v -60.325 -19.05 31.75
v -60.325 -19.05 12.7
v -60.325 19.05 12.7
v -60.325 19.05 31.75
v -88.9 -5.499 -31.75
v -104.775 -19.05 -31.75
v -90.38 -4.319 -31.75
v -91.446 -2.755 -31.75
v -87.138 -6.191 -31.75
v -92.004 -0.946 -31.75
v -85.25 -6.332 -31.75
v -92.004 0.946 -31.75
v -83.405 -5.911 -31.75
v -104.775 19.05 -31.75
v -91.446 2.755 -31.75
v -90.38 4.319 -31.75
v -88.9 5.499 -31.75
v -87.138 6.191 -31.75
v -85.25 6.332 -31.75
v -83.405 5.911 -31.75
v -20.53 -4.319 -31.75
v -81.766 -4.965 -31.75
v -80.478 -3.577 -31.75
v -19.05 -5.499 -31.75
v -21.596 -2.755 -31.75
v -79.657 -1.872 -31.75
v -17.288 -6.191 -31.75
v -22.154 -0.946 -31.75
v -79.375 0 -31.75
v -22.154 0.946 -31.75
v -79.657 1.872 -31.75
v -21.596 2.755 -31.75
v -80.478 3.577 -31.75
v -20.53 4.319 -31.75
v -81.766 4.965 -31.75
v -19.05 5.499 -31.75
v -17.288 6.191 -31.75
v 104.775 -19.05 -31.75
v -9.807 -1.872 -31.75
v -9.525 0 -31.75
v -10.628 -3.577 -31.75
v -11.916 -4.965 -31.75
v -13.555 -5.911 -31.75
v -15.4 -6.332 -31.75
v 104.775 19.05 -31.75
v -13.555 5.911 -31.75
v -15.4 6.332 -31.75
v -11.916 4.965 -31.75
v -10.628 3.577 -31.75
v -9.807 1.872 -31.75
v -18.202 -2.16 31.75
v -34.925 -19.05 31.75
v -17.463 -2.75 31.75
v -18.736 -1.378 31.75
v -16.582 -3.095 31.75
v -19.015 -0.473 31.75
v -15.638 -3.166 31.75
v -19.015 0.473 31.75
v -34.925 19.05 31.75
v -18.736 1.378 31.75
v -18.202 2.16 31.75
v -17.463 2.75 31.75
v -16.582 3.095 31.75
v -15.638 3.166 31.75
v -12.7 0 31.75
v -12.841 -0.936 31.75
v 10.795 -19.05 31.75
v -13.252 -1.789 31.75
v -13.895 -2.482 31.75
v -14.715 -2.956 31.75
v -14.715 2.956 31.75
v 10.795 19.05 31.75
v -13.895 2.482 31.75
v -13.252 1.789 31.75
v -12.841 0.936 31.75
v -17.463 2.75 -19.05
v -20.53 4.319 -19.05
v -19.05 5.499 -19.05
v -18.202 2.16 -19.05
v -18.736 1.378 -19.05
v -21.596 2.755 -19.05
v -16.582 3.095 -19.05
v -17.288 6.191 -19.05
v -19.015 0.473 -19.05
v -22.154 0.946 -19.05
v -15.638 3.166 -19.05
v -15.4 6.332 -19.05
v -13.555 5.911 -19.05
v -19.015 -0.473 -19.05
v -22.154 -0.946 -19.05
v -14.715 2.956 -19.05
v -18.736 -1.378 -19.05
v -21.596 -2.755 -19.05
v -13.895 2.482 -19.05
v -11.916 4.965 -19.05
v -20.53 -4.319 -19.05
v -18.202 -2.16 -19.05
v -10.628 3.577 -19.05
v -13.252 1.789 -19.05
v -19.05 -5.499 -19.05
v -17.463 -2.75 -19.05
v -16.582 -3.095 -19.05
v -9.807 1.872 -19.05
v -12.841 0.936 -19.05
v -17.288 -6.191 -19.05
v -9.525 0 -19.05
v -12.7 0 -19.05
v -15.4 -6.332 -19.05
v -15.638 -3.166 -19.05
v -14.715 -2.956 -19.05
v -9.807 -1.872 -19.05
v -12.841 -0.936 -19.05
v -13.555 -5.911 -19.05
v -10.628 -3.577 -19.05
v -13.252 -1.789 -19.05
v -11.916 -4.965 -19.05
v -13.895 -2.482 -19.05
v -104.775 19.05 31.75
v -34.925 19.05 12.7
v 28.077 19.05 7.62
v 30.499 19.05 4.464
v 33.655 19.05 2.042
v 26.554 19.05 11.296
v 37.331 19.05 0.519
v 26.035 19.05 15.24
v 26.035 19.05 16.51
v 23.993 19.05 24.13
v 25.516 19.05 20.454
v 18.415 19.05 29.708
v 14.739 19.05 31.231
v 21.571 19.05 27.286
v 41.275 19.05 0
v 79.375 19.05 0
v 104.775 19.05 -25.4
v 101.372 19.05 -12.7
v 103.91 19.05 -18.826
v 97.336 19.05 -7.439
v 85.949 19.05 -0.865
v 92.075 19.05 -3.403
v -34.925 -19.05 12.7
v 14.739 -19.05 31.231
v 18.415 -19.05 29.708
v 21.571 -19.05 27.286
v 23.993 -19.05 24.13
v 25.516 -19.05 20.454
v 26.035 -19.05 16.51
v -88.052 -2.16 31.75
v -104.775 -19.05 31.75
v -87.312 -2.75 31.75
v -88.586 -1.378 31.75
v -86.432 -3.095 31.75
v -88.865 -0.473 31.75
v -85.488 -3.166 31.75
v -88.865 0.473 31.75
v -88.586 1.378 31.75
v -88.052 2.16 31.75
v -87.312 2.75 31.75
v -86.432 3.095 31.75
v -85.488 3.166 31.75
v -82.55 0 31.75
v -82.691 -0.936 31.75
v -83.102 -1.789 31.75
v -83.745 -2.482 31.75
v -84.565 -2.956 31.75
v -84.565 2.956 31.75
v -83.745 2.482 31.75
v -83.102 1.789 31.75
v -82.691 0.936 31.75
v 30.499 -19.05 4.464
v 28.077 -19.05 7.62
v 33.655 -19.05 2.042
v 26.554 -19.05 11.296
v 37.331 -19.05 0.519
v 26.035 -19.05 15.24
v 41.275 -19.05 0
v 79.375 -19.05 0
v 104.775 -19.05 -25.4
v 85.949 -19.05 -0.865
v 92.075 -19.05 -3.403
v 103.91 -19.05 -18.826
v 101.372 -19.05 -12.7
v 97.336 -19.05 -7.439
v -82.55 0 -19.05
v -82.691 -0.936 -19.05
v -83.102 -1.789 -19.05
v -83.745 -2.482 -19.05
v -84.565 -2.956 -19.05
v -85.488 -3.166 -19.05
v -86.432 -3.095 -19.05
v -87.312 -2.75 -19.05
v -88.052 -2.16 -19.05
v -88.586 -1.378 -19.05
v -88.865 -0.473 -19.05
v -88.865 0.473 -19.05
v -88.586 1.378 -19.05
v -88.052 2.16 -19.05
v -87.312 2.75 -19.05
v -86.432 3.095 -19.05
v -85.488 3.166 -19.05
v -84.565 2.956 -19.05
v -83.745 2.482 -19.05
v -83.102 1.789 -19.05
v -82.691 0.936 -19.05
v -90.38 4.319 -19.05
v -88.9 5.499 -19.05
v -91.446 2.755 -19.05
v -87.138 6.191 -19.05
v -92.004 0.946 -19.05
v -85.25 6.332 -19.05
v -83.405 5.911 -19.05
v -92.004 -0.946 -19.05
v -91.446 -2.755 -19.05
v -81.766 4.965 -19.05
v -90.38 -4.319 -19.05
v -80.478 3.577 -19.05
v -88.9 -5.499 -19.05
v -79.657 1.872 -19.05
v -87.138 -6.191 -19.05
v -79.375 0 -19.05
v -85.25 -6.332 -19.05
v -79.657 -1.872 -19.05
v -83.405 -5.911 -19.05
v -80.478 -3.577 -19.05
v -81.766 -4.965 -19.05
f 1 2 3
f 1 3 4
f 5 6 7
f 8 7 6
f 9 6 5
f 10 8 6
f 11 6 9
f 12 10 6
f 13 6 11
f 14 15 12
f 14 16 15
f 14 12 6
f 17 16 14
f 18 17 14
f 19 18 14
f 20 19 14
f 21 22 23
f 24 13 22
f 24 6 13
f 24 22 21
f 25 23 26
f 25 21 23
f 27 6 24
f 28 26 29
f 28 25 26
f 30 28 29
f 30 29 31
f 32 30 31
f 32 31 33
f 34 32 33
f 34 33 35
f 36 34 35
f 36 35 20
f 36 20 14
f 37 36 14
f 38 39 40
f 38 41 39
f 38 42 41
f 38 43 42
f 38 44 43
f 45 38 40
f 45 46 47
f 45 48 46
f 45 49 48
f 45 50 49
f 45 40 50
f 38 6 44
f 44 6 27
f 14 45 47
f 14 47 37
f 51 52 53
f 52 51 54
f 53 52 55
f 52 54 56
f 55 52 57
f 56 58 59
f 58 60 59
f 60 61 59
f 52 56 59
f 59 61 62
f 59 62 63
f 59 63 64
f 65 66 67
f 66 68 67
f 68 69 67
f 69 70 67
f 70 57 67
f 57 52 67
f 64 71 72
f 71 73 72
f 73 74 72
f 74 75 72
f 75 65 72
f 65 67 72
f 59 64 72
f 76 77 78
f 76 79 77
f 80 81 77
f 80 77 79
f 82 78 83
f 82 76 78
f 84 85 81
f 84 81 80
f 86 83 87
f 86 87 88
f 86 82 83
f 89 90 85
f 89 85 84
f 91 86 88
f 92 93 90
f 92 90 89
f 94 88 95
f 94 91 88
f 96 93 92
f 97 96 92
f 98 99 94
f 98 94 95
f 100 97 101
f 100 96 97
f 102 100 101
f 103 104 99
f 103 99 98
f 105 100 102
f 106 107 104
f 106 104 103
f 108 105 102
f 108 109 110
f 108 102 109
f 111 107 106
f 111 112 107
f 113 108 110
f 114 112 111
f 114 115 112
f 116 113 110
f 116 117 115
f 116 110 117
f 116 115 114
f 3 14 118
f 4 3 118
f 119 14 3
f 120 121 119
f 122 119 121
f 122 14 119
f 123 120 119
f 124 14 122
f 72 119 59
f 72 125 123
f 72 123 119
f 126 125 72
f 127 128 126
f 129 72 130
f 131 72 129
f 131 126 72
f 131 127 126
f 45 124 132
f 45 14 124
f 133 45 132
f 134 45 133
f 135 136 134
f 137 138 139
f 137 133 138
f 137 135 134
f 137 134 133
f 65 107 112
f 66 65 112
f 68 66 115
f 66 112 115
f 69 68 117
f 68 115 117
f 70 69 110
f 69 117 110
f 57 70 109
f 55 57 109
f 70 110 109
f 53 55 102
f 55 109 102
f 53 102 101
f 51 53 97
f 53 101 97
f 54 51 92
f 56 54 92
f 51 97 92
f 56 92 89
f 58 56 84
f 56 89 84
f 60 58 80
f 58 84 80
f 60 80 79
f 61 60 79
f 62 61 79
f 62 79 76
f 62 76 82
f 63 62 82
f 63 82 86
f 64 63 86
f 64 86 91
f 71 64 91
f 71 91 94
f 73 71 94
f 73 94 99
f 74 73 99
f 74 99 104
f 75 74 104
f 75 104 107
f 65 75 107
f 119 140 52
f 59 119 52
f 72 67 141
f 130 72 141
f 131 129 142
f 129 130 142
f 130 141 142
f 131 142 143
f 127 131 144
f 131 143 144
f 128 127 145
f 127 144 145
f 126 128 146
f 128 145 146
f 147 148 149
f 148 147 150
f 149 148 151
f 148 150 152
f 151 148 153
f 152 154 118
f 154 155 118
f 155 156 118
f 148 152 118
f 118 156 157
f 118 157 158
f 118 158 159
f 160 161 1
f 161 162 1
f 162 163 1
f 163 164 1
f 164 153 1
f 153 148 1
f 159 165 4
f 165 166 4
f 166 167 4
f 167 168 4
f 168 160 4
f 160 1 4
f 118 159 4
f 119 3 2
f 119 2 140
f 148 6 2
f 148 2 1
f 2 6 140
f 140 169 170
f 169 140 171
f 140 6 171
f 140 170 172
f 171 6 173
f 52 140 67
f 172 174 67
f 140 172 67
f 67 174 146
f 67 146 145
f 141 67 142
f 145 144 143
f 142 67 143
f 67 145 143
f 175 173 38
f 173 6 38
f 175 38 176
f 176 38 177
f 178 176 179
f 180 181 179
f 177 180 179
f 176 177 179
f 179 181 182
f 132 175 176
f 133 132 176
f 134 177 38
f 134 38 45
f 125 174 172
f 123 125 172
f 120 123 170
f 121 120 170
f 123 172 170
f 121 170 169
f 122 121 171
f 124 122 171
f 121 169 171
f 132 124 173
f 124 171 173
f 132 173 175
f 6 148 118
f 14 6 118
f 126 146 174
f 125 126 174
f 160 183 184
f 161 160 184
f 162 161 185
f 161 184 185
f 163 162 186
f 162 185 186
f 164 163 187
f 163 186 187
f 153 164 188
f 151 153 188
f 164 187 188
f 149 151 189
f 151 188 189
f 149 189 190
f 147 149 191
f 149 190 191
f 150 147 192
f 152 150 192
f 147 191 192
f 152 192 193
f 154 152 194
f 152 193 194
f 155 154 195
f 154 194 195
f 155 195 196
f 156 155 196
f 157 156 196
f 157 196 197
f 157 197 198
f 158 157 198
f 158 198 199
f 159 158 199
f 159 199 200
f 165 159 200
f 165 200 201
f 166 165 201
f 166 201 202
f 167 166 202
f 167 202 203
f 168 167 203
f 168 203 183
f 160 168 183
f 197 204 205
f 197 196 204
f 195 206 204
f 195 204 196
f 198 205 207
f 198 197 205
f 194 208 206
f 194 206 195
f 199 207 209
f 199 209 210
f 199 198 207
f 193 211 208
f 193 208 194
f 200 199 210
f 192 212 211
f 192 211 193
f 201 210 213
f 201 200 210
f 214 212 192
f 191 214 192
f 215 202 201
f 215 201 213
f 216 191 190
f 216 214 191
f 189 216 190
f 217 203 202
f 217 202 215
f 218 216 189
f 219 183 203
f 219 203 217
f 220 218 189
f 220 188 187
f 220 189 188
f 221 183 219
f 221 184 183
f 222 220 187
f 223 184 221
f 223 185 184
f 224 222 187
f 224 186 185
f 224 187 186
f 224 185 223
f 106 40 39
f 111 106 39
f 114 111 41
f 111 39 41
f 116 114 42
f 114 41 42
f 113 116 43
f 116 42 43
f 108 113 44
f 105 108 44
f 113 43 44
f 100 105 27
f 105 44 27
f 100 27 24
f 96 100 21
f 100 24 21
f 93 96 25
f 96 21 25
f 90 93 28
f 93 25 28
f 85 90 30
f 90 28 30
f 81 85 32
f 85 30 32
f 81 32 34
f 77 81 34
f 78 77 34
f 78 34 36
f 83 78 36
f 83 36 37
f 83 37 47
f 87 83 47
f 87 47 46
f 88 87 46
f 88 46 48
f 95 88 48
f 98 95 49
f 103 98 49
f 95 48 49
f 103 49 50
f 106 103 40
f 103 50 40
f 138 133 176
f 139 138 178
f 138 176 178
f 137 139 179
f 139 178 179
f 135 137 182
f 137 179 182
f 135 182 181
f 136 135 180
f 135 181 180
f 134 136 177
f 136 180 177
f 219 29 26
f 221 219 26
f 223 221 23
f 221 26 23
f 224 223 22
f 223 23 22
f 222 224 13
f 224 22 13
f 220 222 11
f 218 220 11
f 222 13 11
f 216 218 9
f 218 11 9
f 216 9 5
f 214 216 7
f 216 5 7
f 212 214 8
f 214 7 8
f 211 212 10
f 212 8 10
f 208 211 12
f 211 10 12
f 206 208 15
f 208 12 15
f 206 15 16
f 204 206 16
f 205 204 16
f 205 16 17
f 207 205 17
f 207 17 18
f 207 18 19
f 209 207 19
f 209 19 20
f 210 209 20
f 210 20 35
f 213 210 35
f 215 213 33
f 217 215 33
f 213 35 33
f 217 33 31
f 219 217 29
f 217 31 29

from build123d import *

# Parameters (mm, degrees)
F0_W     = 38.1
F0_H     = 63.5
F1_DEPTH = 104.775
F3_DEPTH = 38.101
F4_R     = 6.35
F5_DEPTH = 12.7
F6_R     = 3.175
F7_DEPTH = 50.801
F8_W     = 25.4
F8_H     = 19.05
F9_DEPTH = 38.101


with BuildPart() as f1:
    # F0 (on Right) → F1 (new body, symmetric)
    with BuildSketch(Plane.YZ):
        Rectangle(F0_W, F0_H)
    extrude(amount=F1_DEPTH, both=True)

    # F2 (on face) → F3 (cut, through all)
    with BuildSketch(Plane.XZ.offset(19.05)):
        with BuildLine():
            ThreePointArc((79.375, 0), (97.335512, -7.439488), (104.775, -25.4))
            Line((104.775, -25.4), (104.775, 31.75))
            Line((104.775, 31.75), (10.795, 31.75))
            ThreePointArc((10.795, 31.75), (21.571307, 27.286307), (26.035, 16.51))
            Line((26.035, 16.51), (26.035, 15.24))
            ThreePointArc((26.035, 15.24), (30.498693, 4.463693), (41.275, 0))
            Line((41.275, 0), (79.375, 0))
        make_face()
    extrude(amount=-F3_DEPTH, mode=Mode.SUBTRACT)

    # F4 (on face) → F5 (cut)
    with BuildSketch(Plane(origin=(0, 0, -31.75), x_dir=(1, 0, 0), z_dir=(0, 0, -1))):
        with Locations((-85.725, 0)):
            Circle(F4_R)
        with Locations((-15.875, 0)):
            Circle(F4_R)
    extrude(amount=-F5_DEPTH, mode=Mode.SUBTRACT)

    # F6 (on face) → F7 (cut, through all)
    with BuildSketch(Plane(origin=(0, 0, -19.05), x_dir=(1, 0, 0), z_dir=(0, 0, -1))):
        with Locations((-85.725, 0)):
            Circle(F6_R)
        with Locations((-15.875, 0)):
            Circle(F6_R)
    extrude(amount=-F7_DEPTH, mode=Mode.SUBTRACT)

    # F8 (on face) → F9 (cut, through all)
    with BuildSketch(Plane.XZ.offset(19.05)):
        with Locations((-47.625, 22.225)):
            Rectangle(F8_W, F8_H)
    extrude(amount=-F9_DEPTH, mode=Mode.SUBTRACT)


solid = f1.part
